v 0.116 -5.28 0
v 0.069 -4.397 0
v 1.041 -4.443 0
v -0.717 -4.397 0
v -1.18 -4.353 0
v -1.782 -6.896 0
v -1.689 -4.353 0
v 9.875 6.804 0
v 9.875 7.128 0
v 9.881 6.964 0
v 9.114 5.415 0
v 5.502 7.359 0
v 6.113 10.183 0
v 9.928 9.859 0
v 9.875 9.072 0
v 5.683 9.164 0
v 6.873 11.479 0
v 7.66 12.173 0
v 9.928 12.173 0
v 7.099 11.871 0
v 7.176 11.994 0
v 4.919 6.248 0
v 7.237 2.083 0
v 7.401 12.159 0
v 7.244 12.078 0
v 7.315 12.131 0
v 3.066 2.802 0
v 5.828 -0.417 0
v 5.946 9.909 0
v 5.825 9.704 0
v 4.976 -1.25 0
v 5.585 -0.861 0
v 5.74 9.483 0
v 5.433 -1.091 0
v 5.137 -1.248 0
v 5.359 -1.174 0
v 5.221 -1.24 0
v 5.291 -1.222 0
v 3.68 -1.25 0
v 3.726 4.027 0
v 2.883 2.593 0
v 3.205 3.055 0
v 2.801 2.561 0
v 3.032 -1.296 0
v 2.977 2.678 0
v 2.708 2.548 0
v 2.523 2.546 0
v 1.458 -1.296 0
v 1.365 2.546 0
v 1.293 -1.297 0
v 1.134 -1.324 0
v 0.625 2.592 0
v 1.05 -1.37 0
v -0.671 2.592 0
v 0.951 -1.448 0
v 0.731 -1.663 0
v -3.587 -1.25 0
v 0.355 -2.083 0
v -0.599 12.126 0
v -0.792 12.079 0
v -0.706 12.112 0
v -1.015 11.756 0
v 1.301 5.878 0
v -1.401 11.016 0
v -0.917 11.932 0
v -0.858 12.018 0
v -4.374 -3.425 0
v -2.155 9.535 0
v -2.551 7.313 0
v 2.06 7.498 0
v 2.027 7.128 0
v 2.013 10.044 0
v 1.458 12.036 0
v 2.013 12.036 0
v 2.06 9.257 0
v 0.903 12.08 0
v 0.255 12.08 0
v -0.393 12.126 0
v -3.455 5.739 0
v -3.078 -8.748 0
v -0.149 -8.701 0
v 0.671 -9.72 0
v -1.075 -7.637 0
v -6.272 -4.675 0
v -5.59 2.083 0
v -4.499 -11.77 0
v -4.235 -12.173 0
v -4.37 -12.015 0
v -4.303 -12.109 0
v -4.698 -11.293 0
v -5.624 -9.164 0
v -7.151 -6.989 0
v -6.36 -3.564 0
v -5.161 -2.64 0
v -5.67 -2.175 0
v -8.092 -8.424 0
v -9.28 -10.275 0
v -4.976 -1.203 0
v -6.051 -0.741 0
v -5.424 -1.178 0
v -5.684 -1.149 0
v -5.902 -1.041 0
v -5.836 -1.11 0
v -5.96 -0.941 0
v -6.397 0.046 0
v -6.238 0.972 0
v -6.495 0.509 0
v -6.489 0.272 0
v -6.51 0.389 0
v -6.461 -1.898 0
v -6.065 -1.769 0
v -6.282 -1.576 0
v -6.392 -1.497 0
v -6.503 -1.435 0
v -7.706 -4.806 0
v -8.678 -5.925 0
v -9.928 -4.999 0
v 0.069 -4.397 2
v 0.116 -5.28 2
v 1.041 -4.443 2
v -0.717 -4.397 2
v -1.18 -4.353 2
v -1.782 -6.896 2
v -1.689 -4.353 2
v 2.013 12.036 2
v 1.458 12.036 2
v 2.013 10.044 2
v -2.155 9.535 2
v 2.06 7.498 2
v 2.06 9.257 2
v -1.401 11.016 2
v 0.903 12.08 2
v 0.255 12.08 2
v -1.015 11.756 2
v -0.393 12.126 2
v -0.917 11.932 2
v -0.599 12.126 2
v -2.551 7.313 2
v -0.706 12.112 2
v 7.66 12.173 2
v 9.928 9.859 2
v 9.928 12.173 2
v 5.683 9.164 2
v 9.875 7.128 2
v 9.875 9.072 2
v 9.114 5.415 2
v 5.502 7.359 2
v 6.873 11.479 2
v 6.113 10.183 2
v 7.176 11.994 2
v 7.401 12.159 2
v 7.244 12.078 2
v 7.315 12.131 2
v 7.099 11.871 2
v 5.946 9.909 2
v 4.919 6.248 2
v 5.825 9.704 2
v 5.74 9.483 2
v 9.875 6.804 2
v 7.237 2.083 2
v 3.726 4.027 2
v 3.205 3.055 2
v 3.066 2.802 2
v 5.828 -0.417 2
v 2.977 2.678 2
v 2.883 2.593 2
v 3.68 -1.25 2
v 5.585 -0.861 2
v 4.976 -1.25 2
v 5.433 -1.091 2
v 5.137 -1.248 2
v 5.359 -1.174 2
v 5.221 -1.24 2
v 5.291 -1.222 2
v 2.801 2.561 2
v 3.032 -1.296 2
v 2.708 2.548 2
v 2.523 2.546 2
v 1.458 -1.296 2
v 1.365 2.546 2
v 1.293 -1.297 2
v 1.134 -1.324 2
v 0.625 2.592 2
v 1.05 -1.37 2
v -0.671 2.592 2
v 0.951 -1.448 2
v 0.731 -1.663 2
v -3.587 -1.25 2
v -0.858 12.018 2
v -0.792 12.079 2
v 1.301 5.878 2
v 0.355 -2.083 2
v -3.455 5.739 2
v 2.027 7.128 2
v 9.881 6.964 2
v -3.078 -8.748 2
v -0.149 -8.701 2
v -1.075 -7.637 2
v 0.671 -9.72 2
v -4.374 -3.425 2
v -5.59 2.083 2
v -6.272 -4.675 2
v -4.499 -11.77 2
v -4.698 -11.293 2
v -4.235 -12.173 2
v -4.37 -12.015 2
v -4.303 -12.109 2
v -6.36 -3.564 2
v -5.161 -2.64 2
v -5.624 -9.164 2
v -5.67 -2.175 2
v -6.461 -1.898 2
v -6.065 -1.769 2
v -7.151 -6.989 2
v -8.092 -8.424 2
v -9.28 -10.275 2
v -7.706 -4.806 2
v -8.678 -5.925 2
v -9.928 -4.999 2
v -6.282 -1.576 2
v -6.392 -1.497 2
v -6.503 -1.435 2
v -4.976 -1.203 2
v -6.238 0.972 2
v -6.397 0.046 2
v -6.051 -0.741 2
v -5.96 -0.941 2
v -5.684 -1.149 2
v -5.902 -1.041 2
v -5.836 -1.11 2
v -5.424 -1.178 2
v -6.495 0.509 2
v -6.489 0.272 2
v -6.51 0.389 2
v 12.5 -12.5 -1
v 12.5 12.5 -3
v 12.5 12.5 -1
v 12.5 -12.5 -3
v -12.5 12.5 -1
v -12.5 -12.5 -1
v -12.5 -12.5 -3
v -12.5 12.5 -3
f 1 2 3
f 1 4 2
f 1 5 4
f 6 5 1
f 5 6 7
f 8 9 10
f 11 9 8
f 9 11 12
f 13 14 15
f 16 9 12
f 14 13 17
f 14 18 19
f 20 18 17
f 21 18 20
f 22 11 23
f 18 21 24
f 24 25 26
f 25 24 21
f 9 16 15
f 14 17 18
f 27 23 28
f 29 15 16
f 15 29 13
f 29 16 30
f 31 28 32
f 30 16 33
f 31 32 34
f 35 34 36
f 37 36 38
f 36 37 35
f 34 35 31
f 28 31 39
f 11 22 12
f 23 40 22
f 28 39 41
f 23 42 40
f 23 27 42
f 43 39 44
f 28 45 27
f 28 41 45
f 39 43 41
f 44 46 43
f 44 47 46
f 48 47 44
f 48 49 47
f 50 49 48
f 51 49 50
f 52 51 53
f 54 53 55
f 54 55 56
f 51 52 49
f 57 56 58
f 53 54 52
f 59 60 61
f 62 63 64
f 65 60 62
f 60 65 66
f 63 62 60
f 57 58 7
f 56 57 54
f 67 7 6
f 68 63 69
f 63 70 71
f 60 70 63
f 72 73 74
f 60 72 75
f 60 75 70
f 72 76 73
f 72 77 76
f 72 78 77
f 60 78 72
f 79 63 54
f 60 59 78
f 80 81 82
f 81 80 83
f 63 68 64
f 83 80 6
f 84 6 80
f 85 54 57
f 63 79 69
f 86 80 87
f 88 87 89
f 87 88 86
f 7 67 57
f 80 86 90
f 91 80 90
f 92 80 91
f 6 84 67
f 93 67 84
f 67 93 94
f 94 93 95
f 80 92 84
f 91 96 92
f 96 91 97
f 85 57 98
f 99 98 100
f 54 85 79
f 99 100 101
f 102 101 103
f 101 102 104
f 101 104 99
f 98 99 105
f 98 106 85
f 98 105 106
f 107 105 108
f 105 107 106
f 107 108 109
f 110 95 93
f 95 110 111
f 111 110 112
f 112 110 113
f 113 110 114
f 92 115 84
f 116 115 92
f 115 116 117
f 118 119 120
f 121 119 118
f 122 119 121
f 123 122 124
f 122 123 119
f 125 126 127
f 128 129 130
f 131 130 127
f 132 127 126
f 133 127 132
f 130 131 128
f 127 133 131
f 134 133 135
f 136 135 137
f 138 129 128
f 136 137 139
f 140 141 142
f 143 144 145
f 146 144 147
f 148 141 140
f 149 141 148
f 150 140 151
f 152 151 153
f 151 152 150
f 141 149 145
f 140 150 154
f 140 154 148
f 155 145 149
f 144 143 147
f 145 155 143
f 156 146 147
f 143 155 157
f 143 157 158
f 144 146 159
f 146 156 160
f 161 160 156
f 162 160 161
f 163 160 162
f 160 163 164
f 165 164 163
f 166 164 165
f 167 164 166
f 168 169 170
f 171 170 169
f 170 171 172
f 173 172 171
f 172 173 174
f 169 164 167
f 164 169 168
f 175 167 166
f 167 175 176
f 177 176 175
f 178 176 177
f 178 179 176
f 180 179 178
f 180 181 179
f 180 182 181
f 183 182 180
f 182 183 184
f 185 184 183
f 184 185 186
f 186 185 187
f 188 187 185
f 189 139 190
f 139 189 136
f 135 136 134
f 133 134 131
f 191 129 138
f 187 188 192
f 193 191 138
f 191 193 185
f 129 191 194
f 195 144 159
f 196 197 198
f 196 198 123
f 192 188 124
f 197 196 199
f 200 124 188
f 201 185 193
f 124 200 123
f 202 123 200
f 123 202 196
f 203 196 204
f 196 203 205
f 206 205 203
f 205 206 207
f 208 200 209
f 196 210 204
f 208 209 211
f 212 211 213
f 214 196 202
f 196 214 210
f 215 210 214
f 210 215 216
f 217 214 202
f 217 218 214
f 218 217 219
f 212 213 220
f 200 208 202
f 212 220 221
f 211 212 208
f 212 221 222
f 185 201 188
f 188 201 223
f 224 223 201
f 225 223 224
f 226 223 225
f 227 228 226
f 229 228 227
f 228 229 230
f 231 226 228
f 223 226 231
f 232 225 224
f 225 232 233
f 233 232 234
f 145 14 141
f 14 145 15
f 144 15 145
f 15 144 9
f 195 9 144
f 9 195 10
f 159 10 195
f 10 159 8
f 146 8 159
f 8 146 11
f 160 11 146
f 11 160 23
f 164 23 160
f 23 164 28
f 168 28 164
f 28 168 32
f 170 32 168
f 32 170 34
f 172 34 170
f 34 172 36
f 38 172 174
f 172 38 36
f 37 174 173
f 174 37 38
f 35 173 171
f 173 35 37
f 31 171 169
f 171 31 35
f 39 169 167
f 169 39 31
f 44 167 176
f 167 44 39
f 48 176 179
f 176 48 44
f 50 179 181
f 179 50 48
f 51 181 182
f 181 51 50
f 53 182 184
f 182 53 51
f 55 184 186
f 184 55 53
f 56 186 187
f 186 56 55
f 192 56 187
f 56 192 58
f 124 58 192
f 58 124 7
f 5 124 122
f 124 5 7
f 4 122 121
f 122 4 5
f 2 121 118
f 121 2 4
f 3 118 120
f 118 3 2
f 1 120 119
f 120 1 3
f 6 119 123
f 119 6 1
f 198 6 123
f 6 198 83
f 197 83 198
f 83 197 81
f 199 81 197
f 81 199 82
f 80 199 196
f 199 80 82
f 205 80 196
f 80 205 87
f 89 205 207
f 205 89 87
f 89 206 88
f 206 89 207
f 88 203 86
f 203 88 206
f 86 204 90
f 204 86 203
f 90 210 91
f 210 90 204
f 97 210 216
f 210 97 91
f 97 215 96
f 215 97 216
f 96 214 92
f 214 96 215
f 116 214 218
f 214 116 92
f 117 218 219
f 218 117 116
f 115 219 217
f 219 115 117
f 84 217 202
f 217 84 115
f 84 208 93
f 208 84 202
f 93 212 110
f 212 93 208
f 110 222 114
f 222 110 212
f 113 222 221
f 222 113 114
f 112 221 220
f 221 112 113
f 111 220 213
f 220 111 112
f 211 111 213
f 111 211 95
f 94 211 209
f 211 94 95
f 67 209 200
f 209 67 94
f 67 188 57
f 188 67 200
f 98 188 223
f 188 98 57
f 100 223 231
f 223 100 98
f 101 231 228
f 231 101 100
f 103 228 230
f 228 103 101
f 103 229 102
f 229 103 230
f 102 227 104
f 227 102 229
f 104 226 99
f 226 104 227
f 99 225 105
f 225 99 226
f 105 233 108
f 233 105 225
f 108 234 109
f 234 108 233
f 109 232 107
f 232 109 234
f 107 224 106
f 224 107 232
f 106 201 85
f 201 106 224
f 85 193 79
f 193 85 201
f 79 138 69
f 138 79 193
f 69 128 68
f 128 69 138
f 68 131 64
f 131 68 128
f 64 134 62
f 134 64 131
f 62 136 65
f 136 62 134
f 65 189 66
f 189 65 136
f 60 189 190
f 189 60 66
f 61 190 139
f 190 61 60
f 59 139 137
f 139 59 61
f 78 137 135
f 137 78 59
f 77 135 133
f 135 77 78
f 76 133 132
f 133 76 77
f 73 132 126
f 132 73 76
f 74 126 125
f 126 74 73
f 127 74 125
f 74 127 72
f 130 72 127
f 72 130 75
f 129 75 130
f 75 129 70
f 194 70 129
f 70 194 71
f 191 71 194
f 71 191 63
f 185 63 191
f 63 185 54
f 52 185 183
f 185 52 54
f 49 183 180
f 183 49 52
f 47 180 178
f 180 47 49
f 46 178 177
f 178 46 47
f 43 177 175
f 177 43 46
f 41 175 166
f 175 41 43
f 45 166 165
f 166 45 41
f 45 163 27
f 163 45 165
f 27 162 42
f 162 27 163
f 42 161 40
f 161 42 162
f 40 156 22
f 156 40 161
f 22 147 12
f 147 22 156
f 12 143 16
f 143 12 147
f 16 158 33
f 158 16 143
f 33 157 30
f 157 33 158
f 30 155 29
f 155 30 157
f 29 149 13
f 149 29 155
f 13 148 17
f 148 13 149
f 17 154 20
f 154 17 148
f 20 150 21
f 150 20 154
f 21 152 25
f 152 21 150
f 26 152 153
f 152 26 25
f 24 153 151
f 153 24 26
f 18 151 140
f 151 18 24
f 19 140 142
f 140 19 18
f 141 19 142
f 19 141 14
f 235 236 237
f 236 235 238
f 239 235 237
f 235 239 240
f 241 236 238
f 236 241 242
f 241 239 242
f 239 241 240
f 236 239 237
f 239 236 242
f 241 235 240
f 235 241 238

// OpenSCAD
// file: ../../spurs-a.scad
// Module names are of the form poly_<inkscape-path-id>().  As a result,
// you can associate a polygon in this OpenSCAD program with the corresponding
// SVG element in the Inkscape document by looking for the XML element with
// the attribute id="inkscape-path-id".

module spur(zLength)
{
  scale([25.4/90, -25.4/90, 2])
  translate([0, 0, -2])
//  union()
  {
    linear_extrude(height = zLength)
    polygon([[13.500000,-56.000000],[29.500000,-55.000000],[54.500000,-55.000000],[58.503750,-55.048750],[60.522969,-55.341719],[62.290000,-56.020000],[64.325156,-57.853594],[66.241250,-60.541250],[69.240000,-66.000000],[80.500000,-87.000000],[106.280000,-135.000000],[118.870000,-159.000000],[122.780000,-198.000000],[124.023594,-204.882813],[125.843750,-209.652500],[128.457031,-214.095937],[132.080000,-220.000000],[148.490000,-248.000000],[153.376719,-256.487656],[155.041895,-259.143652],[156.518750,-260.956250],[158.055137,-262.086816],[159.898906,-262.696719],[165.500000,-263.000000],[214.500000,-263.000000],[214.500000,-213.000000],[213.360000,-196.000000],[213.360000,-154.000000],[213.495000,-150.462500],[213.360000,-147.000000],[196.920000,-117.000000],[156.350000,-45.000000],[125.920000,9.000000],[120.671250,18.592500],[117.385469,23.577187],[115.794199,25.366055],[114.320000,26.400000],[112.797344,26.797500],[110.981250,26.970000],[107.500000,27.000000],[79.500000,27.000000],[65.500000,28.000000],[31.500000,28.000000],[27.943750,28.030000],[24.500000,28.600000],[22.684180,29.597539],[20.548438,31.277812],[15.792500,35.922500],[7.670000,45.000000],[-36.500000,94.040000],[-25.500000,94.040000],[-15.500000,95.000000],[1.500000,95.000000],[22.500000,96.000000],[2.500000,114.080000],[-38.500000,149.000000],[-23.230000,165.000000],[-3.230000,188.000000],[14.500000,210.000000],[-66.500000,189.000000],[-91.500000,263.000000],[-92.970664,261.624141],[-94.426562,259.592500],[-97.197500,254.302500],[-101.500000,244.000000],[-121.500000,198.000000],[-200.500000,222.000000],[-174.840000,182.000000],[-154.500000,151.000000],[-187.500000,128.020000],[-214.500000,108.000000],[-166.500000,103.830000],[-135.500000,101.000000],[-137.410000,77.000000],[-139.590000,41.000000],[-140.500000,31.000000],[-138.108496,32.343340],[-135.722969,34.055469],[-131.038750,38.223750],[-122.500000,47.000000],[-111.500000,57.040000],[-94.500000,74.000000],[-77.500000,27.000000],[-107.500000,26.000000],[-117.196250,25.451250],[-122.812656,24.814531],[-126.090000,23.980000],[-127.513906,22.488438],[-128.773750,20.335000],[-130.730000,16.000000],[-138.200000,-1.000000],[-140.195000,-5.868750],[-140.649688,-8.406719],[-140.330000,-11.000000],[-134.780000,-21.000000],[-120.780000,-45.000000],[-74.650000,-124.000000],[-55.110000,-158.000000],[-46.570000,-206.000000],[-30.280000,-238.000000],[-21.920000,-254.000000],[-19.818750,-257.793750],[-18.535156,-259.646094],[-17.110000,-260.980000],[-15.251406,-261.684844],[-12.943750,-261.983750],[-8.500000,-261.990000],[5.500000,-261.000000],[19.500000,-261.000000],[31.500000,-260.040000],[43.500000,-260.040000],[43.500000,-217.000000],[44.500000,-200.000000],[44.500000,-162.000000],[43.800000,-154.000000],[28.100000,-127.000000],[-14.500000,-56.000000],[13.500000,-56.000000]]);
  }
}

module spurThumbnail(height = 1)
{
    xyScale = 0.164;
    translate([0,0,4])
    scale([xyScale, xyScale, 1])
    spur(zLength = height);
}
// file: ../../../../external-resources/thumbnail-background.scad
module thumbnailBackground()
{
	color("green")
	translate([0, 0, -2])
	cube([25, 25, 2], center=true);	
}
// main file
use <../../../../external-resources/thumbnail-background.scad>
use <../../spurs-a.scad>

spurThumbnail();

thumbnailBackground();
